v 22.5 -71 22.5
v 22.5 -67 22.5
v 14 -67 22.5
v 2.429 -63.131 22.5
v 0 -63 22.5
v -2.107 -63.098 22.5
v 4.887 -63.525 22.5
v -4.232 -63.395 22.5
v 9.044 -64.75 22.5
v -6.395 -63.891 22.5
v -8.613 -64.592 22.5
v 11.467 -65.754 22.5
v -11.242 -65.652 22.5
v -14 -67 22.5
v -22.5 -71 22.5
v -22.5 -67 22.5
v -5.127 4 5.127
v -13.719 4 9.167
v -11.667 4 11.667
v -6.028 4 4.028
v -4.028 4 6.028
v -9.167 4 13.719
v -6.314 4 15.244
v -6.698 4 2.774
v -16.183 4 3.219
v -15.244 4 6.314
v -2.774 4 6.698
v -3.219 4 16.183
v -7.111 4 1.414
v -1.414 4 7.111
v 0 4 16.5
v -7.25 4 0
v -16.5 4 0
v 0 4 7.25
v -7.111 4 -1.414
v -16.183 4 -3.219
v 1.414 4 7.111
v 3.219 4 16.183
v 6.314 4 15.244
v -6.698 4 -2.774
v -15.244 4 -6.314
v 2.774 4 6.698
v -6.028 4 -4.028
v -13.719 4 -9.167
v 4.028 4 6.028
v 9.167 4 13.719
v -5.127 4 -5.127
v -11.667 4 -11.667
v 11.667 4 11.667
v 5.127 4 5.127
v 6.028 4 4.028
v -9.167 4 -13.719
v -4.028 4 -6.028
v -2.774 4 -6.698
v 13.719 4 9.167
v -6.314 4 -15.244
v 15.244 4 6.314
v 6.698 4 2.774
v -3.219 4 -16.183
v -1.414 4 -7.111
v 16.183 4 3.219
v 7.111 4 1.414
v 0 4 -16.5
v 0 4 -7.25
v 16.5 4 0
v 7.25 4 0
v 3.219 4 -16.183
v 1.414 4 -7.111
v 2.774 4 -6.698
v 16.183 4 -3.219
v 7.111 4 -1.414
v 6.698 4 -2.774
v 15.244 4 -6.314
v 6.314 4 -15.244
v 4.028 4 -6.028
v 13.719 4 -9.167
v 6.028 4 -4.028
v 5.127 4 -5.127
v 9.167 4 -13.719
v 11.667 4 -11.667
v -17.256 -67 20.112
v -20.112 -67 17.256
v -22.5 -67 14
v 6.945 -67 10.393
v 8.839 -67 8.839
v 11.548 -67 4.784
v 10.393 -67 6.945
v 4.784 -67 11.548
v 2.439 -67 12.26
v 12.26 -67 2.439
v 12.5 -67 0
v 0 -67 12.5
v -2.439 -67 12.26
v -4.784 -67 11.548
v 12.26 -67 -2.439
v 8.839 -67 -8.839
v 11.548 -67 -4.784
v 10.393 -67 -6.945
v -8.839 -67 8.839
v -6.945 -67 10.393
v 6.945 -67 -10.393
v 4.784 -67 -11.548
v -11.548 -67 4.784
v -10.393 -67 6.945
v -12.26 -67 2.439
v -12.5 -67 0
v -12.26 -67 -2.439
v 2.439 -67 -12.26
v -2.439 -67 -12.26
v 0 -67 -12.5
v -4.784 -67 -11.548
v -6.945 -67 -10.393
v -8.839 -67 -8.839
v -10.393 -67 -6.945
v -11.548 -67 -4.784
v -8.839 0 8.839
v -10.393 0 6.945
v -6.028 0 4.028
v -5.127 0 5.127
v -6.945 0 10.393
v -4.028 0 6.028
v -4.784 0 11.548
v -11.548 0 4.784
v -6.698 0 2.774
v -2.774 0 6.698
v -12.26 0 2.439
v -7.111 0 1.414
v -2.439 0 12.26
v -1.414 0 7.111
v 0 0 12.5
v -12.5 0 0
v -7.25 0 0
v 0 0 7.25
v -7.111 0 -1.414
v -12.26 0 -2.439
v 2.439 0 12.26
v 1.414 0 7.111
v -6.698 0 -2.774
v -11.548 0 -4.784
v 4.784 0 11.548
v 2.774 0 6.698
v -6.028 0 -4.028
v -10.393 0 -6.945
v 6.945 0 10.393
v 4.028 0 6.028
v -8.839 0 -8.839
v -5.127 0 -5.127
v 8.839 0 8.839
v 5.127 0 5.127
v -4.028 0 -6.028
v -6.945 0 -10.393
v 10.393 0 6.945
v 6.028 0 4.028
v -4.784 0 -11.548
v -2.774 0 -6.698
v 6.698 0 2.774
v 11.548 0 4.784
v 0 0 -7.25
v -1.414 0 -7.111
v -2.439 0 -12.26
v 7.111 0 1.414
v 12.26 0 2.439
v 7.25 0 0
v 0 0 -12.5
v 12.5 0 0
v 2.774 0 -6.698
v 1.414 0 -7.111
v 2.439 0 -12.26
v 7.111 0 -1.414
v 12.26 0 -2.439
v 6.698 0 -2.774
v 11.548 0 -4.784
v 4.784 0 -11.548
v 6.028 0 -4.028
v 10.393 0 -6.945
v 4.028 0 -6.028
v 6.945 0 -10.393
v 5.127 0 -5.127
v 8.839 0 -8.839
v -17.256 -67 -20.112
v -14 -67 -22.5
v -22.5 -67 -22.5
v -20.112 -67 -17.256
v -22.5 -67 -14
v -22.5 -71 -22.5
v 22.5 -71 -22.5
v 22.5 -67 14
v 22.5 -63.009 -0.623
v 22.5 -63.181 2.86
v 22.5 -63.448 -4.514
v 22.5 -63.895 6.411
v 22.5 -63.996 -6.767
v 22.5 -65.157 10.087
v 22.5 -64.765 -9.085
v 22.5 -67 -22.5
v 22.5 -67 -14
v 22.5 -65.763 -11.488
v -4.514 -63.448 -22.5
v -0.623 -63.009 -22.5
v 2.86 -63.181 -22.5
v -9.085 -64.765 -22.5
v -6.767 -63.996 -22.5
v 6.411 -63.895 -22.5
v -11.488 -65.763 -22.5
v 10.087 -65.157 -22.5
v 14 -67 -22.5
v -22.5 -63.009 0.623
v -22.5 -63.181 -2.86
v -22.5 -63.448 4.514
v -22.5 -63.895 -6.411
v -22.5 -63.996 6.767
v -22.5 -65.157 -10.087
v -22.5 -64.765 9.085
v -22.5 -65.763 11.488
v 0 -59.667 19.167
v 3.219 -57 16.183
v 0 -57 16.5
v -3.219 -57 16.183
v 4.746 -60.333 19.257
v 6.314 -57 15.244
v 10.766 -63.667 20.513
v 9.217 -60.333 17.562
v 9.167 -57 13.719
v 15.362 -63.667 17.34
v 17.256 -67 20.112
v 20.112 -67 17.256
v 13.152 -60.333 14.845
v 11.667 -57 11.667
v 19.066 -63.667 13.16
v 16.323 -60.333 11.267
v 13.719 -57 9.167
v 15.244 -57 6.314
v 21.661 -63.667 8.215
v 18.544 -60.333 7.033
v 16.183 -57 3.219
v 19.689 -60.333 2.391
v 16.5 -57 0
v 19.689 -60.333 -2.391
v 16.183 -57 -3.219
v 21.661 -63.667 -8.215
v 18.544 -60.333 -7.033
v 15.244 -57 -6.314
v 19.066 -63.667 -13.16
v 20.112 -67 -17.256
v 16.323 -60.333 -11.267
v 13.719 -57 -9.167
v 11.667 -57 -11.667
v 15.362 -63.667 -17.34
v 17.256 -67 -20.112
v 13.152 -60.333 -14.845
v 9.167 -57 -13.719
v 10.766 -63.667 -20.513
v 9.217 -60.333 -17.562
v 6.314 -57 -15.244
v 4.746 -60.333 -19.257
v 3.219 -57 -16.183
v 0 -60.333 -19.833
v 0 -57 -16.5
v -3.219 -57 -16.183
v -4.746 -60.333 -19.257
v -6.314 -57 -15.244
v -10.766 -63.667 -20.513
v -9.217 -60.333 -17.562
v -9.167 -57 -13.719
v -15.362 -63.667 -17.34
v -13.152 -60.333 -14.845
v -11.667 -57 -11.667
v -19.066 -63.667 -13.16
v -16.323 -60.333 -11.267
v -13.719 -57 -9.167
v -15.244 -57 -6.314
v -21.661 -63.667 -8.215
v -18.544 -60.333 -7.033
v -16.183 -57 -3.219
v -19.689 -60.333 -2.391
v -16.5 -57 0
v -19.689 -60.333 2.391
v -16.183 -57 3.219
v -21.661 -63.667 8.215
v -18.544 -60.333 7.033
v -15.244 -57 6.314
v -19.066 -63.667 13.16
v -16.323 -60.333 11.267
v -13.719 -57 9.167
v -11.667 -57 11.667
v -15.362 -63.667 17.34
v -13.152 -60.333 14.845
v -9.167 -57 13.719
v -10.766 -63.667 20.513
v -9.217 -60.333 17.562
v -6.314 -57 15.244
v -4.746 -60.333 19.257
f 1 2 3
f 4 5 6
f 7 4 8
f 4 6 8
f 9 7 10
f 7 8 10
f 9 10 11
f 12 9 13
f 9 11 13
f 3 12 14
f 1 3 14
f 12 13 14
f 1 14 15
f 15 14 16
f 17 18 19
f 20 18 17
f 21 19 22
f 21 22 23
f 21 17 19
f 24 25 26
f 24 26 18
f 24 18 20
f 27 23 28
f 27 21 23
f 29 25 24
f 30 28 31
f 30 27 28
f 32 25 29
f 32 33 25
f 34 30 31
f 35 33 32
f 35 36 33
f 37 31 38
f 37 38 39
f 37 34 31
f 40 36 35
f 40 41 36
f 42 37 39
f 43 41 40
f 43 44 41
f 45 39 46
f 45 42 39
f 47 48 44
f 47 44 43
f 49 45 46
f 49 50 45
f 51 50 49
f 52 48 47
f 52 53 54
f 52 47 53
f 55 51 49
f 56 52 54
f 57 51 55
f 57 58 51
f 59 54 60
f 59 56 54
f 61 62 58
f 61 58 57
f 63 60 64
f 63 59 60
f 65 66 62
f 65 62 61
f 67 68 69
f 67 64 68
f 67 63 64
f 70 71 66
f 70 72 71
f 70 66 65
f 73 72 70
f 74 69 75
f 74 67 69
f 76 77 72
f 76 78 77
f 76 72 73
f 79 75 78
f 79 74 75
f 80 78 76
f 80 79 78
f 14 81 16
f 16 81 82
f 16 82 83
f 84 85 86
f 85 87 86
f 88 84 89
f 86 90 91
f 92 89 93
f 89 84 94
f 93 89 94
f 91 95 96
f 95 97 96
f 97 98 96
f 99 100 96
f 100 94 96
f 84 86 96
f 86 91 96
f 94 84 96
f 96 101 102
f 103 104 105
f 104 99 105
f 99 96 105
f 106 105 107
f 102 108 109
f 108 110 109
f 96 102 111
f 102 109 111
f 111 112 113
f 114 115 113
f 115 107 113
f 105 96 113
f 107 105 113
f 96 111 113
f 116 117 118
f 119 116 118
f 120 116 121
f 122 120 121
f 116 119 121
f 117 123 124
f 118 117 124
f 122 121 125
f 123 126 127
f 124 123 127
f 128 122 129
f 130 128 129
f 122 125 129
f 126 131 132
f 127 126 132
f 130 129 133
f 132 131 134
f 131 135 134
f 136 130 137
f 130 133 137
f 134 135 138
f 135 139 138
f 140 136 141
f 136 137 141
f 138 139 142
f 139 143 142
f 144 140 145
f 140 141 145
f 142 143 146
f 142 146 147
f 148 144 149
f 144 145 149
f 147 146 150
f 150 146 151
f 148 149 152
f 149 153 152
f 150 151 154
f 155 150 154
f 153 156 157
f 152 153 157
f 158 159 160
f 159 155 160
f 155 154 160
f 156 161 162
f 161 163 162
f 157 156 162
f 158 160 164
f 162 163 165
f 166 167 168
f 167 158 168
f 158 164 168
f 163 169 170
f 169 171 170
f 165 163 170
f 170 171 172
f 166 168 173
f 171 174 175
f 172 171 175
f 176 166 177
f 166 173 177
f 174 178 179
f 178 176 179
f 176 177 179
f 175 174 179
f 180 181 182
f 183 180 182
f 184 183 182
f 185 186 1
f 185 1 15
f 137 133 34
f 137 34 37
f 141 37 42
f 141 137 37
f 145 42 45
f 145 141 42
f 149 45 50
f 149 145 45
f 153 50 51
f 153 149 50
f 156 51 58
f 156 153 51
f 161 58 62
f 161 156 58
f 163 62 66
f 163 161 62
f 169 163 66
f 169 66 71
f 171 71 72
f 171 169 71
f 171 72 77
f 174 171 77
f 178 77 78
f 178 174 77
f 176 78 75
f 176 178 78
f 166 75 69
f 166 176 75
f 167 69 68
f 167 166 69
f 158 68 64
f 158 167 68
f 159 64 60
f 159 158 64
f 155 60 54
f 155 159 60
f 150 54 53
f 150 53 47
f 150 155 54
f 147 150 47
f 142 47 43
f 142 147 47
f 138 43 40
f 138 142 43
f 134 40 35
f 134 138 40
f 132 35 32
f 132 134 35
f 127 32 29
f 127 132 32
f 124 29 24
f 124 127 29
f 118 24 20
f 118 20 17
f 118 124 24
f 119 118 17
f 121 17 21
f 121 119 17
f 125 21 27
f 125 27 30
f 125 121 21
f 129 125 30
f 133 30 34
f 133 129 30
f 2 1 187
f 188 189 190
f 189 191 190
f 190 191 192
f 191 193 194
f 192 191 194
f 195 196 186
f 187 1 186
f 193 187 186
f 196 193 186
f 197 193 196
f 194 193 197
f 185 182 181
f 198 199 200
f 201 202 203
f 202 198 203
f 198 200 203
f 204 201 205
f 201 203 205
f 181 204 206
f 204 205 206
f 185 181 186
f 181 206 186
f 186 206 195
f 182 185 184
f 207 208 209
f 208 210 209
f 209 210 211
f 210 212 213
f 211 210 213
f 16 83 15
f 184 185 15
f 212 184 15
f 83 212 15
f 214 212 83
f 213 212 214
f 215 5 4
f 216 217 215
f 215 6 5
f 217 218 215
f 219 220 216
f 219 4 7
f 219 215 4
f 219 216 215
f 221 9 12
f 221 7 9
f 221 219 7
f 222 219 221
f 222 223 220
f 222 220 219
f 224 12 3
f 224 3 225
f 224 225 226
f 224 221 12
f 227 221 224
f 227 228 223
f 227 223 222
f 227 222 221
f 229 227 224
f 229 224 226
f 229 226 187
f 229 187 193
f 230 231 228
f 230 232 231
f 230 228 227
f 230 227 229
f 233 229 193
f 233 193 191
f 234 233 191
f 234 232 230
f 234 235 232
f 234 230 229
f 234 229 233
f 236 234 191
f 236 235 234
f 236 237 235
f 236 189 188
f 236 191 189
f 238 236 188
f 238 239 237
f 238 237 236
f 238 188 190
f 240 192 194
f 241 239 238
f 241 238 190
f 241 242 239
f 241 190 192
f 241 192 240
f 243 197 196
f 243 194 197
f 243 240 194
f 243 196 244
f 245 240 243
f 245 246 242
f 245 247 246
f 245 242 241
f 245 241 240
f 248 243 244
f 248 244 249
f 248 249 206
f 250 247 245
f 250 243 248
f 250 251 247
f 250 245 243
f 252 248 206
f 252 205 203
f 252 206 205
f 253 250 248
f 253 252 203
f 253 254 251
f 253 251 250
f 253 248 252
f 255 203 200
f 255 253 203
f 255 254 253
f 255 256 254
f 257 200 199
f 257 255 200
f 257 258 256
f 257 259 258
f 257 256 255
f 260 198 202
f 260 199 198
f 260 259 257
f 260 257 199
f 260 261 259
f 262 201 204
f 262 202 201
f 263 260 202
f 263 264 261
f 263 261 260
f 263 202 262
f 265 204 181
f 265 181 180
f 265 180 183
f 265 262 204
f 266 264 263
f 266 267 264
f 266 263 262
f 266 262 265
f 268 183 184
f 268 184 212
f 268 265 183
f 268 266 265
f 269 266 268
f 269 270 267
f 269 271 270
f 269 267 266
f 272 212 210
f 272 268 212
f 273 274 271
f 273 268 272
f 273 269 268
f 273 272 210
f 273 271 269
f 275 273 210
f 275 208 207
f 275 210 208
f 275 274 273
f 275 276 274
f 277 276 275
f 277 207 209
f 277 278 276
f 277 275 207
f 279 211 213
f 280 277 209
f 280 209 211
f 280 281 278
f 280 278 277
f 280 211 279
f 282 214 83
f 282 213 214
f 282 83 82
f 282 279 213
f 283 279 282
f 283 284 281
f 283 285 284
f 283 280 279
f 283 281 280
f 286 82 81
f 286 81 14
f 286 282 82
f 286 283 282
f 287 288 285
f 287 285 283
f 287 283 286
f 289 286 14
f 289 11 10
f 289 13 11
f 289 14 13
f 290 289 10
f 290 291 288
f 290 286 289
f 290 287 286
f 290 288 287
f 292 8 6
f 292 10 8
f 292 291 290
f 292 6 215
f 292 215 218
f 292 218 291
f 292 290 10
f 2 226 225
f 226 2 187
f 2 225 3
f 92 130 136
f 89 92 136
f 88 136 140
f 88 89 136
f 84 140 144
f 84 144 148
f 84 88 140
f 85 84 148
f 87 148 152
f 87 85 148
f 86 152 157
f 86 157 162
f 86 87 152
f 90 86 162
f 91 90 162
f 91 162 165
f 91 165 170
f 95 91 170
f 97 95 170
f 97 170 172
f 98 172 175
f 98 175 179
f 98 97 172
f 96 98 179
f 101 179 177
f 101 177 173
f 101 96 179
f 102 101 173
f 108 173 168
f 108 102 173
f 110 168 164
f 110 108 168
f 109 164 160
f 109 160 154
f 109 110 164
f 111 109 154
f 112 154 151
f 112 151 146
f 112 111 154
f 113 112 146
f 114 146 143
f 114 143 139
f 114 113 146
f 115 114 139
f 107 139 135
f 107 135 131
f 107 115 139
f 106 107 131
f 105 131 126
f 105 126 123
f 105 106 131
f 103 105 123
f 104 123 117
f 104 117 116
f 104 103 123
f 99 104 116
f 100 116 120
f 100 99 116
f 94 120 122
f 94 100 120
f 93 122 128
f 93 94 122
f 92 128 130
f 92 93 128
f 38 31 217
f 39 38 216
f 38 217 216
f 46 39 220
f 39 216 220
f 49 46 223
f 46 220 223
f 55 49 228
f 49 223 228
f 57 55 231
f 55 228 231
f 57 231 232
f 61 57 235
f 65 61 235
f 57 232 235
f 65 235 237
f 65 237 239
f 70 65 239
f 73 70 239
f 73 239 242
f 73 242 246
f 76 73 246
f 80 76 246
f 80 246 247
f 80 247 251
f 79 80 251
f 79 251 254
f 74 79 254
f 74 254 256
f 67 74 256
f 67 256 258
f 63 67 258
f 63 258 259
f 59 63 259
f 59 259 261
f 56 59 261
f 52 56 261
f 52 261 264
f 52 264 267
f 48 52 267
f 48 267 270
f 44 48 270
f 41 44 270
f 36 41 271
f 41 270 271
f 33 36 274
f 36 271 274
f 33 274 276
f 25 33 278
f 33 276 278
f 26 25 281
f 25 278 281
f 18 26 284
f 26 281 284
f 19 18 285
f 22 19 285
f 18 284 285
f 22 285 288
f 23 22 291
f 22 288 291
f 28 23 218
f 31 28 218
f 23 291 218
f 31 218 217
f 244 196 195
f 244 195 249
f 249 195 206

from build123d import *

# Parameters (mm, degrees)
SKETCH2_R           = 16.5
SKETCH2_R_2         = 12.5
SKETCH2_R_3         = 7.25
BOSS_EXTRUDE1_DEPTH = 4
BOSS_EXTRUDE3_START = -67
SKETCH2_4_R         = 16.5
SKETCH2_4_R_2       = 12.5
BOSS_EXTRUDE3_DEPTH = 67
SKETCH3_W           = 45
SKETCH3_H           = 45
BOSS_EXTRUDE4_DEPTH = 4
CHAMFER1_SIZE       = 10


with BuildPart() as part:
    # Sketch2 → Boss-Extrude1 (new body)
    # profile 1 of 2: a face of its own
    with BuildSketch(Plane(origin=(0, 0, 0), x_dir=(1, 0, 0), z_dir=(0, 1, 0))):
        with Locations(Location((0, 0, 0), (0, 0, 270))):
            Circle(SKETCH2_R)
        Circle(SKETCH2_R_2, mode=Mode.SUBTRACT)
    # profile 2 of 2: a face of its own
    with BuildSketch(Plane(origin=(0, 0, 0), x_dir=(1, 0, 0), z_dir=(0, 1, 0))):
        Circle(SKETCH2_R_2)
        with Locations(Location((0, 0, 0), (0, 0, 270))):
            Circle(SKETCH2_R_3, mode=Mode.SUBTRACT)
    extrude(amount=BOSS_EXTRUDE1_DEPTH)

    # Sketch2<4> → Boss-Extrude3 (add)
    with BuildSketch(Plane(origin=(0, 0, 0), x_dir=(1, 0, 0), z_dir=(0, 1, 0)).offset(BOSS_EXTRUDE3_START)):
        with Locations(Location((0, 0, 0), (0, 0, 270))):
            Circle(SKETCH2_4_R)
        with Locations(Location((0, 0, 0), (0, 0, 270))):
            Circle(SKETCH2_4_R_2, mode=Mode.SUBTRACT)
    extrude(amount=BOSS_EXTRUDE3_DEPTH)

    # Sketch3 → Boss-Extrude4 (add)
    with BuildSketch(Plane(origin=(0, -67, 0), x_dir=(-1, 0, 0), z_dir=(0, -1, 0))):
        Rectangle(SKETCH3_W, SKETCH3_H)
    extrude(amount=BOSS_EXTRUDE4_DEPTH)

    # Chamfer1
    # the kernel refuses this chamfer: 10 mm, written as the material it adds along each edge
    with BuildSketch(Plane(origin=(0, -67, 0), x_dir=(0, 0, 1), z_dir=(-1, 0, 0))) as chamfer1_piece_1_section:
        Polygon((16.5 + CHAMFER1_SIZE, 0), (16.5, CHAMFER1_SIZE), (16.5, 0), align=None)
    chamfer1_piece_1 = revolve(axis=Axis((0, -67, 0), (0, 1, 0)), mode=Mode.PRIVATE)
    chamfer1_piece_1 = split(chamfer1_piece_1, bisect_by=Plane(origin=(0, -62.130236746, -22.5), z_dir=(0, 0, 1)), keep=Keep.TOP, mode=Mode.PRIVATE)
    chamfer1_piece_1 = split(chamfer1_piece_1, bisect_by=Plane(origin=(22.5, -62.130236746, -21.369763254), z_dir=(-1, 0, 0)), keep=Keep.TOP, mode=Mode.PRIVATE)
    chamfer1_piece_1 = split(chamfer1_piece_1, bisect_by=Plane(origin=(-22.5, -62.130236746, -21.369763254), z_dir=(1, 0, 0)), keep=Keep.TOP, mode=Mode.PRIVATE)
    chamfer1_piece_1 = split(chamfer1_piece_1, bisect_by=Plane(origin=(0, -62.130236746, 22.5), z_dir=(0, 0, -1)), keep=Keep.TOP, mode=Mode.PRIVATE)
    add(chamfer1_piece_1)


solid = part.part
